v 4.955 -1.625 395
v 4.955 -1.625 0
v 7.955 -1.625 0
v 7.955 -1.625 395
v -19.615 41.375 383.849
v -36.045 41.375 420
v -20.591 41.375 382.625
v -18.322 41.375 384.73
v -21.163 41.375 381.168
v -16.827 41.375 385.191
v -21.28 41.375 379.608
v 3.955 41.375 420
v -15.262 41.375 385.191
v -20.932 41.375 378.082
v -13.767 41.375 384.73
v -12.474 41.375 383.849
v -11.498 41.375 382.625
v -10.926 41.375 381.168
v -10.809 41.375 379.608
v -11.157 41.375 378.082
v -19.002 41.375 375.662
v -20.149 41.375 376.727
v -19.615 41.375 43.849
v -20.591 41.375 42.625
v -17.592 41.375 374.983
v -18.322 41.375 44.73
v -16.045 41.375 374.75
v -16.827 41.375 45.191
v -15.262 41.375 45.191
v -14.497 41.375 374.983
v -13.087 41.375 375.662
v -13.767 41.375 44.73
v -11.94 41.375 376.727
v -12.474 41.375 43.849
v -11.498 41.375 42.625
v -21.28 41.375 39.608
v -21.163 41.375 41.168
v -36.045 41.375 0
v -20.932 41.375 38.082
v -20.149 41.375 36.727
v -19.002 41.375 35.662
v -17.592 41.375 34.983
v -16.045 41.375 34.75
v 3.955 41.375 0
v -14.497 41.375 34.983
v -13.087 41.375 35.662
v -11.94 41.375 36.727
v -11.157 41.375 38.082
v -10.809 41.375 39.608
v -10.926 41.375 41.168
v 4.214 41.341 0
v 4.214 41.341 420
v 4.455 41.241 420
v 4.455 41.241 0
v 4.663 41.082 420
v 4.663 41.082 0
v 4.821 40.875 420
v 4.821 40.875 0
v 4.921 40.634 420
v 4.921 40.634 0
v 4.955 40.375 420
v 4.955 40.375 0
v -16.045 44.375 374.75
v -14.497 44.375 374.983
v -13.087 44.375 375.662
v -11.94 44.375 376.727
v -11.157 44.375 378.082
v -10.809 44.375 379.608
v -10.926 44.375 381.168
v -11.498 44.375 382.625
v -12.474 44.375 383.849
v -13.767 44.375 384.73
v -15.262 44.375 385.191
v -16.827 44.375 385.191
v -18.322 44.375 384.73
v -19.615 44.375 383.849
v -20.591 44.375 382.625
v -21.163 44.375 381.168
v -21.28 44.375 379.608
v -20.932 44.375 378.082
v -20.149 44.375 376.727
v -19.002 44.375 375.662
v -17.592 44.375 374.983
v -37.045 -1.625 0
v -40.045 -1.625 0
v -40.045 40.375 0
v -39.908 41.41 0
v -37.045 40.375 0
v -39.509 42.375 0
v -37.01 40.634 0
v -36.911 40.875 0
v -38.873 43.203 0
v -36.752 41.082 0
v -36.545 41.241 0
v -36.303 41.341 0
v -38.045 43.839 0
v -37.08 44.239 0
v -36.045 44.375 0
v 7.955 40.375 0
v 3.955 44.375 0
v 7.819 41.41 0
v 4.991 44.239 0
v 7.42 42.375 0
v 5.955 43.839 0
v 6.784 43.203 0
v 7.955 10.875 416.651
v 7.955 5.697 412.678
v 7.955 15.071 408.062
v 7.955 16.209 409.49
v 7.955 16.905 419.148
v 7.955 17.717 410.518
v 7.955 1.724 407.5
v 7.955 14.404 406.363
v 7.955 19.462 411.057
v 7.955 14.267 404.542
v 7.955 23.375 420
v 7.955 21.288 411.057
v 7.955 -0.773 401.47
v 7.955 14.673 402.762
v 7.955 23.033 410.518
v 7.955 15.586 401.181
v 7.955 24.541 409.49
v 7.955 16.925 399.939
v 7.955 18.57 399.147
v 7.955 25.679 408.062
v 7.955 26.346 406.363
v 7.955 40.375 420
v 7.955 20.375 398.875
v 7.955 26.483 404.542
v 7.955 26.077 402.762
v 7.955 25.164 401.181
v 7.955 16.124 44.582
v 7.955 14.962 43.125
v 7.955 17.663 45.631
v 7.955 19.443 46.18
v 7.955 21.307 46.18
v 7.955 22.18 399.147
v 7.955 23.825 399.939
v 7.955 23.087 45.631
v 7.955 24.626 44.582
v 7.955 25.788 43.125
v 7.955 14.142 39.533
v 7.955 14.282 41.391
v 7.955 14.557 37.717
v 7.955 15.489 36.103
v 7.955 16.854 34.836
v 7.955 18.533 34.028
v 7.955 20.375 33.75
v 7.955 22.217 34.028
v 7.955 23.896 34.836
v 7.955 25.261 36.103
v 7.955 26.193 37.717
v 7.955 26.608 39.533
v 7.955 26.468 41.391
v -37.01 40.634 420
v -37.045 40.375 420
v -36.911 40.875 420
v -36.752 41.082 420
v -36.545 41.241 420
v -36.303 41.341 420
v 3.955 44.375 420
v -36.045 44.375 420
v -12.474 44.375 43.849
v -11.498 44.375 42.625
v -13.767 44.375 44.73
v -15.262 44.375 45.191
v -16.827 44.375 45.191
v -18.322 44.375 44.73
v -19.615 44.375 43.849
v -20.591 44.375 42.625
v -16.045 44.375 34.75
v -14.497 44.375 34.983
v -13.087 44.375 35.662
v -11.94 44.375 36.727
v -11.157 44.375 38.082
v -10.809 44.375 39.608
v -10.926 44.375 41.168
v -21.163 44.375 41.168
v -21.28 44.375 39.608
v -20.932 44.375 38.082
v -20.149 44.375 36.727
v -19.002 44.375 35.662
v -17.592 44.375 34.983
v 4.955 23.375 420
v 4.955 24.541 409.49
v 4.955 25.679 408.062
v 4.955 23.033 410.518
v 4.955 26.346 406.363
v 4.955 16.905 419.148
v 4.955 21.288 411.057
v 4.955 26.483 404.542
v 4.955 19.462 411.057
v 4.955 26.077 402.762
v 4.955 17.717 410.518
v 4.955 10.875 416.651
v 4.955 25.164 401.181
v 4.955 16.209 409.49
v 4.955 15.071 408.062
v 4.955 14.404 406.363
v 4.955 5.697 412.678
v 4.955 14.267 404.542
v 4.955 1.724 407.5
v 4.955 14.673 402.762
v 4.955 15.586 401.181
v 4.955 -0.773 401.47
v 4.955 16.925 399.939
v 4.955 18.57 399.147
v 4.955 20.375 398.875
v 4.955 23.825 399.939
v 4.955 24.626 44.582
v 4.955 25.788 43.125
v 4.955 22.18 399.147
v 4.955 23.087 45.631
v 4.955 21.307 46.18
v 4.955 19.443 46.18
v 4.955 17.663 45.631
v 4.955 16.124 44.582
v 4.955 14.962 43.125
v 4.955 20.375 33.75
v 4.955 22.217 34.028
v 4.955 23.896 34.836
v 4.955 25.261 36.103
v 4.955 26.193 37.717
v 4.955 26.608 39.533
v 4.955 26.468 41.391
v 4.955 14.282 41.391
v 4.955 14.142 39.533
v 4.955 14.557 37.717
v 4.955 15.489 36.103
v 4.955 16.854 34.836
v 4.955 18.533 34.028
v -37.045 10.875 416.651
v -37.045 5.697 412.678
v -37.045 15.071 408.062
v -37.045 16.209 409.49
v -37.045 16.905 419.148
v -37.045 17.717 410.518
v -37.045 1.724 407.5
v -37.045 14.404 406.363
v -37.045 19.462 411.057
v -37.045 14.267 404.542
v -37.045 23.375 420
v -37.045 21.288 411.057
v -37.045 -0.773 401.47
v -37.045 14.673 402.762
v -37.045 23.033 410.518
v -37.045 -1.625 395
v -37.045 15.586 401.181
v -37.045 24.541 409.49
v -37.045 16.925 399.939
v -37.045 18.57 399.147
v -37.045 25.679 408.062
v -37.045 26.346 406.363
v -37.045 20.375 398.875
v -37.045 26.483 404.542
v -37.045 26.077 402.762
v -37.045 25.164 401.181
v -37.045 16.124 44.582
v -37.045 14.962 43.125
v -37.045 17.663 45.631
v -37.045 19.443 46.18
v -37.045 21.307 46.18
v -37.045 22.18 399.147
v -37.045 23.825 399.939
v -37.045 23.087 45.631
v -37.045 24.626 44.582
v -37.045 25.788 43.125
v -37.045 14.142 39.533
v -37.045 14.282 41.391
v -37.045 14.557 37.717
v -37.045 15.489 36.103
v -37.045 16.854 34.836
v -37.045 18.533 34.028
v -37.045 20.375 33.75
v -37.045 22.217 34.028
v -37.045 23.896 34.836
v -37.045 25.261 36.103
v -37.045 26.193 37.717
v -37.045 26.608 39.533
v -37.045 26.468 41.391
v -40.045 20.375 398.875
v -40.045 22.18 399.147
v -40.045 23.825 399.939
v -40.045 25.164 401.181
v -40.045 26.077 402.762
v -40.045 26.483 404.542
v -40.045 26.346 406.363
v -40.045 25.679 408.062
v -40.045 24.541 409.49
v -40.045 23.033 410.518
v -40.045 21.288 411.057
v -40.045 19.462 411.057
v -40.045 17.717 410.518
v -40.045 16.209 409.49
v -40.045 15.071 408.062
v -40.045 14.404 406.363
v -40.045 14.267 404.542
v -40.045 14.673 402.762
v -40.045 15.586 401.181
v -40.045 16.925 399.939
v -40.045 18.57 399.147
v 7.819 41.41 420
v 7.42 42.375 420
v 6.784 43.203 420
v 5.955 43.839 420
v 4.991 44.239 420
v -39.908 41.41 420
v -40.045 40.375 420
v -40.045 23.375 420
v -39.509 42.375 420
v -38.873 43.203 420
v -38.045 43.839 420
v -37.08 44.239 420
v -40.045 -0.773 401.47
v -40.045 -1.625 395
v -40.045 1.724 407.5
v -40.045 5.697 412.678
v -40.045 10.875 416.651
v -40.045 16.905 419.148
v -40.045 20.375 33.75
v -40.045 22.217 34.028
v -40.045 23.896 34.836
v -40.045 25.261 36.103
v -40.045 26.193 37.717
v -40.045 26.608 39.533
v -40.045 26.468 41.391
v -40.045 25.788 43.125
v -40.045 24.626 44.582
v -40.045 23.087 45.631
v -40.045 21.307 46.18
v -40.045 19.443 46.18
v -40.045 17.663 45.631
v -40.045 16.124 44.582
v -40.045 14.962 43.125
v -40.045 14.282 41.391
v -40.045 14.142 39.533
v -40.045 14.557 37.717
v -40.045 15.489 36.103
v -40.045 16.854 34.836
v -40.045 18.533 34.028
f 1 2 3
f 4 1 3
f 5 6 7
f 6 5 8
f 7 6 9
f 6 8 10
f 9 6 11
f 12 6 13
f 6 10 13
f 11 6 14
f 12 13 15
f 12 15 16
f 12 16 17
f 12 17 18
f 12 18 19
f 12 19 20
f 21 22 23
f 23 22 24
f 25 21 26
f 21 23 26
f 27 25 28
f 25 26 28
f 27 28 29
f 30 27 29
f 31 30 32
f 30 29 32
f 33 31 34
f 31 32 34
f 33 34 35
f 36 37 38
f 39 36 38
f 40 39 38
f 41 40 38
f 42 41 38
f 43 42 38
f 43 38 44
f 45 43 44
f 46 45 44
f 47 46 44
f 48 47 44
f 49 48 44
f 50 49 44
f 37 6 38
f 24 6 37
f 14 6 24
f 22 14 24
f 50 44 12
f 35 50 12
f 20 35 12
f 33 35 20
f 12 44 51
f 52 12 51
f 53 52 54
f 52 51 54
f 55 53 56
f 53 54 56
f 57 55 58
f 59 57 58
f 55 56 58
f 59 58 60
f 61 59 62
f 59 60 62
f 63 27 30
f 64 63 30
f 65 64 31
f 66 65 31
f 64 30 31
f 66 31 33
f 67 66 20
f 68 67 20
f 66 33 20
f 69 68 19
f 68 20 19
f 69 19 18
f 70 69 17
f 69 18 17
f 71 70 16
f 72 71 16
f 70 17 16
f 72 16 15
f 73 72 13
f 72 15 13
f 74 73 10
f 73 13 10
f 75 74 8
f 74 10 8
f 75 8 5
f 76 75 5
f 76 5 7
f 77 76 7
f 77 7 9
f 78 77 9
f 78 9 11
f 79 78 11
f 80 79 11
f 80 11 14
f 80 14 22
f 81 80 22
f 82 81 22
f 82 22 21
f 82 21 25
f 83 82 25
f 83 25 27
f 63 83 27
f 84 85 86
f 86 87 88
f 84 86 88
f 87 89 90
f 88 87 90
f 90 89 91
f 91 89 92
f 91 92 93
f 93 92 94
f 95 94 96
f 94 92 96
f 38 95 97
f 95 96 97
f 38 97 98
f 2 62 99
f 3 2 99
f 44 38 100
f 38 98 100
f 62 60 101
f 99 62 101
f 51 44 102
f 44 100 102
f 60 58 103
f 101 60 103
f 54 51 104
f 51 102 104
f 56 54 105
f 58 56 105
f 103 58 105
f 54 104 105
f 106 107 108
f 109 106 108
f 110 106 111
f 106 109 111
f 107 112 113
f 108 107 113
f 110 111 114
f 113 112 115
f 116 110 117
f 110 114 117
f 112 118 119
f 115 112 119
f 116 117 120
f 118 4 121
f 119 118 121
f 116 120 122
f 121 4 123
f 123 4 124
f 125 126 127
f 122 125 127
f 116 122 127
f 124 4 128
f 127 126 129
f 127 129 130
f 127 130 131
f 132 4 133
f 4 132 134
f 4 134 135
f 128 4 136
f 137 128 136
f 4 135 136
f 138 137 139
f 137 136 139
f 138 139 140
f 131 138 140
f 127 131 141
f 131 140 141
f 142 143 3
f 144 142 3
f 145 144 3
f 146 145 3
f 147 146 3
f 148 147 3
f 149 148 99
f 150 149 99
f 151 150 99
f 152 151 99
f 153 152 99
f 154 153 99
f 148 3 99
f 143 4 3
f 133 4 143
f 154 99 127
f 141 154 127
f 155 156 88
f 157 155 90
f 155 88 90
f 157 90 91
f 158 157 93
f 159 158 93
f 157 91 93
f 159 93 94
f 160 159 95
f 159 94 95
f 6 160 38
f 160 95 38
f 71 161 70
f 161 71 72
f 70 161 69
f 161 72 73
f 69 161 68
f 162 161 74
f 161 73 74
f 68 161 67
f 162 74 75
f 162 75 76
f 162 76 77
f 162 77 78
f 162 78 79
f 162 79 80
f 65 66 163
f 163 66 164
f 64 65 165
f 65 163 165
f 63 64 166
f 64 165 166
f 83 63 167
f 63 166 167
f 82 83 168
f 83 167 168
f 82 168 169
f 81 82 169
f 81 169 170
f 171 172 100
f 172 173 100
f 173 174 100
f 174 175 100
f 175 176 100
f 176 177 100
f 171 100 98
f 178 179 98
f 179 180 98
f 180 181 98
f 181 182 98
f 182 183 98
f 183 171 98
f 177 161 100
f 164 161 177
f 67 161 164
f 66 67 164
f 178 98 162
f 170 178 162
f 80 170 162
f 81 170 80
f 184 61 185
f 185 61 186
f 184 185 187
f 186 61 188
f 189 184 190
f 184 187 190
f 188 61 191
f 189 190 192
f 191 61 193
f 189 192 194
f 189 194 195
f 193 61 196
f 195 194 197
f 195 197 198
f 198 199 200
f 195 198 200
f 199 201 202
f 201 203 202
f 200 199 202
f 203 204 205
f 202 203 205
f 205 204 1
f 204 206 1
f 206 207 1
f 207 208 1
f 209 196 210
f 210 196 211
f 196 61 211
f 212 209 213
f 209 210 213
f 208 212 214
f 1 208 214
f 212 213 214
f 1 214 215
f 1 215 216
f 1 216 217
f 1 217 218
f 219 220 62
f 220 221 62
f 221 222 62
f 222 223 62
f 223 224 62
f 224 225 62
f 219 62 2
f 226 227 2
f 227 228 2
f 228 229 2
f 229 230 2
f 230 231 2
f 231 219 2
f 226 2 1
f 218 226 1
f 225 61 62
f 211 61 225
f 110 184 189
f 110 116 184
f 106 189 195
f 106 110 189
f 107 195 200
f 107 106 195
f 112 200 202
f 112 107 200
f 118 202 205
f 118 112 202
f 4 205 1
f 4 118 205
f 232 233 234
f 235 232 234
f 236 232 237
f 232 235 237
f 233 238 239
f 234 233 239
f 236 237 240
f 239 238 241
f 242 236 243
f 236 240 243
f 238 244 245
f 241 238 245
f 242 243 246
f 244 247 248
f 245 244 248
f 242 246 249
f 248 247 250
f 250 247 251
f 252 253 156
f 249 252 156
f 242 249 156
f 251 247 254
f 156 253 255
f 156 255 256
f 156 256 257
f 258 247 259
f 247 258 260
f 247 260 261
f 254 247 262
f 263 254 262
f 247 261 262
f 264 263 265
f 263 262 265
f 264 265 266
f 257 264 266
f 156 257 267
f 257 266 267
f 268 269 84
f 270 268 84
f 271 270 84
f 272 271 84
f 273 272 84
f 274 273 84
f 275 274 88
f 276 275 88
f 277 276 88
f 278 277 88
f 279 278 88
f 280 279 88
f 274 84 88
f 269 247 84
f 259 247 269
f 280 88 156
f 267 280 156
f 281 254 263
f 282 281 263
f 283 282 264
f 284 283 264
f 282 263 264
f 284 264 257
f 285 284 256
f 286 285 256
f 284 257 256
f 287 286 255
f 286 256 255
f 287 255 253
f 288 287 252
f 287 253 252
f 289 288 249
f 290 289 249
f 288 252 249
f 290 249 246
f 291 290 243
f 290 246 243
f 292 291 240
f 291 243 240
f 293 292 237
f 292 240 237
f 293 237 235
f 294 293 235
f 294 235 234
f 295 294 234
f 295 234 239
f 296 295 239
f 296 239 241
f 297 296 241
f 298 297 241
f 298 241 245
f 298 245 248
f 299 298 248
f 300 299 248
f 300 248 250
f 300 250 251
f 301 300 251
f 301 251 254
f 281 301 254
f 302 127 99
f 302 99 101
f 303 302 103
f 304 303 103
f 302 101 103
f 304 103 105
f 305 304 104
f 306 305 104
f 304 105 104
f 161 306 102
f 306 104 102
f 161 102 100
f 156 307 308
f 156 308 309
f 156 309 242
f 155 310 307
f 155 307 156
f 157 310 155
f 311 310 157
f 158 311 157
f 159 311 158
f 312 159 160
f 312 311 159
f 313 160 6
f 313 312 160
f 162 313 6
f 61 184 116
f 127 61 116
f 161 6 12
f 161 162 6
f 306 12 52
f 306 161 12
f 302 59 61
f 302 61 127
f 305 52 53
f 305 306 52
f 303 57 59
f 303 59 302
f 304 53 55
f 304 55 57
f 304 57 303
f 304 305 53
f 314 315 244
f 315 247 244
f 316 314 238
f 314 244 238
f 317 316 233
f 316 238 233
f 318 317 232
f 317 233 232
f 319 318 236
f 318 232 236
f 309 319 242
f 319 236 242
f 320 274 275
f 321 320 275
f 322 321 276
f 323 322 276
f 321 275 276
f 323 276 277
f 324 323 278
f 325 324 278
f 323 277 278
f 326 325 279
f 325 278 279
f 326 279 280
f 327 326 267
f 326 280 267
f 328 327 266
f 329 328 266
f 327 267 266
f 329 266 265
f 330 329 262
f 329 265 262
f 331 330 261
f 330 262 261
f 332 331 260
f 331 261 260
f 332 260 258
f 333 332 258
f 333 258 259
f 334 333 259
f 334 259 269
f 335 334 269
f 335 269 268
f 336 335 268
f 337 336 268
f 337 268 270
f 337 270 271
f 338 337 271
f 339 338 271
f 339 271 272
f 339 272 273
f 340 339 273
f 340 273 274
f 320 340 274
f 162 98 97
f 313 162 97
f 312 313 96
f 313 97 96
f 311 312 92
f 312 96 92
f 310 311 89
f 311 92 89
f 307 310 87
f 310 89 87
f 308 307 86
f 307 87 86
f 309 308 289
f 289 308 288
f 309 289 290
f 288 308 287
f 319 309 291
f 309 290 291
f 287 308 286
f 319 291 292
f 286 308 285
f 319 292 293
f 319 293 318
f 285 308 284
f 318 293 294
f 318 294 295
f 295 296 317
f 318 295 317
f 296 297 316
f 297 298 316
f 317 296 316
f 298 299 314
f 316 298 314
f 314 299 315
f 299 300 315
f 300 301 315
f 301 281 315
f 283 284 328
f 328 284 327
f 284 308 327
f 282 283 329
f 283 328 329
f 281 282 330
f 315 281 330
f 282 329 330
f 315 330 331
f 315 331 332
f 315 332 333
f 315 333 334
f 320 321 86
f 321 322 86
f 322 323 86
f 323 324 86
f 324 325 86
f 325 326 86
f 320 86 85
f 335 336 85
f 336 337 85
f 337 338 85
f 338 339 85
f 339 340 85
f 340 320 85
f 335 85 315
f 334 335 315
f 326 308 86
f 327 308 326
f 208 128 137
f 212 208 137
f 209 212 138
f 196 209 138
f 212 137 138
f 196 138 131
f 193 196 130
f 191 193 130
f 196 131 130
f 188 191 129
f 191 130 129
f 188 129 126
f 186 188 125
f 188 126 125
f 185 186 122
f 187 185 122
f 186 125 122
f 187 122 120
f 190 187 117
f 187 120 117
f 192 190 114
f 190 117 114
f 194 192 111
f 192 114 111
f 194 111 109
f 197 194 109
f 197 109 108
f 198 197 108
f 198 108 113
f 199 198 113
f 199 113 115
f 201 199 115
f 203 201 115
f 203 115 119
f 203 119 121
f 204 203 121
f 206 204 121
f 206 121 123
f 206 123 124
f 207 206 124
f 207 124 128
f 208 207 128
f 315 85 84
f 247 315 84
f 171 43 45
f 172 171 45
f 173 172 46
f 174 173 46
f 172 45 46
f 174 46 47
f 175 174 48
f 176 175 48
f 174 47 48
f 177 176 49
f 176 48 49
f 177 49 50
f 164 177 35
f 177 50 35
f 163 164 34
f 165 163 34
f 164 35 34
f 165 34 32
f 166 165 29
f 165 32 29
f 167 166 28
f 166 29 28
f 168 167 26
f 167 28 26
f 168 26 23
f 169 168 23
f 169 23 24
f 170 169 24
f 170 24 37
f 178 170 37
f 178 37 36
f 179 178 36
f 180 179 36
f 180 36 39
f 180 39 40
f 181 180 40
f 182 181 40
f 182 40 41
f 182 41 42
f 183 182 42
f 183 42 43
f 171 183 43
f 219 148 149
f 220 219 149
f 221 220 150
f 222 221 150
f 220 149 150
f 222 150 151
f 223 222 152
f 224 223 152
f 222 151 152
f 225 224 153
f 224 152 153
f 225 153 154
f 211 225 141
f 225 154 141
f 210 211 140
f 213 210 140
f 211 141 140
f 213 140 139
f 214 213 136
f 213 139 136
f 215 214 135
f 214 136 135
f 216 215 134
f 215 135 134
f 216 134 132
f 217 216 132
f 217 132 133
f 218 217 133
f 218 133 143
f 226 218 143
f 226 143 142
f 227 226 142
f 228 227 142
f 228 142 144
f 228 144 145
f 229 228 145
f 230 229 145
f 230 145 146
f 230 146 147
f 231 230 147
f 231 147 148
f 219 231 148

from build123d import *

# Parameters (mm, degrees)
EKSTR_ZYON_NCE10_DEPTH                = 420
M12_HELISARMAL_I_IN_Z_VANA_MATKAB_1_D = 12.5
M12_HELISARMAL_I_IN_Z_VANA_MATKAB_2_D = 12.25
M10_HELISARMAL_I_IN_Z_VANA_MATKAB_1_D = 10.5
RADYUS1_R                             = 25
RADYUS2_R                             = 25


with BuildPart() as part:
    # Çizim1 → Ekstrüzyon-İnce10 (new body)
    with BuildSketch(Plane.XY):
        with BuildLine():
            Line((-37.044551646, -1.625), (-37.044551646, 40.375))
            ThreePointArc((-37.044551646, 40.375), (-36.751658427, 41.082106781), (-36.044551646, 41.375))
            Line((-36.044551646, 41.375), (3.955448354, 41.375))
            ThreePointArc((3.955448354, 41.375), (4.662555135, 41.082106781), (4.955448354, 40.375))
            Line((4.955448354, 40.375), (4.955448354, -1.625))
            Line((4.955448354, -1.625), (7.955448354, -1.625))
            Line((7.955448354, -1.625), (7.955448354, 40.375))
            ThreePointArc((7.955448354, 40.375), (6.783875479, 43.203427125), (3.955448354, 44.375))
            Line((3.955448354, 44.375), (-36.044551646, 44.375))
            ThreePointArc((-36.044551646, 44.375), (-38.872978771, 43.203427125), (-40.044551646, 40.375))
            Line((-40.044551646, 40.375), (-40.044551646, -1.625))
            Line((-40.044551646, -1.625), (-37.044551646, -1.625))
        make_face()
    extrude(amount=EKSTR_ZYON_NCE10_DEPTH)

    # M12 Helisarmal için Zıvana matkabı1 (through all)
    with Locations(Plane.ZY.offset(40.044551646)):
        with Locations((40, 20.375)):
            Hole(M12_HELISARMAL_I_IN_Z_VANA_MATKAB_1_D / 2)

    # M12 Helisarmal için Zıvana matkabı2 (through all)
    with Locations(Plane.ZY.offset(40.044551646)):
        with Locations((405, 20.375)):
            Hole(M12_HELISARMAL_I_IN_Z_VANA_MATKAB_2_D / 2)

    # M10 Helisarmal için Zıvana matkabı1 (through all)
    with Locations(Plane(origin=(-16.044551646, 44.375, 380), x_dir=(0, 0, 1), z_dir=(0, 1, 0))):
        with Locations((0, 0), (-340, 0)):
            Hole(M10_HELISARMAL_I_IN_Z_VANA_MATKAB_1_D / 2)

    # Radyus1
    radyus1_edges = [part.edges().sort_by_distance(p)[0] for p in [
        (-38.544551646, -1.625, 420),
    ]]
    fillet(radyus1_edges, radius=RADYUS1_R)

    # Radyus2
    radyus2_edges = [part.edges().sort_by_distance(p)[0] for p in [
        (6.455448354, -1.625, 420),
    ]]
    fillet(radyus2_edges, radius=RADYUS2_R)


solid = part.part
